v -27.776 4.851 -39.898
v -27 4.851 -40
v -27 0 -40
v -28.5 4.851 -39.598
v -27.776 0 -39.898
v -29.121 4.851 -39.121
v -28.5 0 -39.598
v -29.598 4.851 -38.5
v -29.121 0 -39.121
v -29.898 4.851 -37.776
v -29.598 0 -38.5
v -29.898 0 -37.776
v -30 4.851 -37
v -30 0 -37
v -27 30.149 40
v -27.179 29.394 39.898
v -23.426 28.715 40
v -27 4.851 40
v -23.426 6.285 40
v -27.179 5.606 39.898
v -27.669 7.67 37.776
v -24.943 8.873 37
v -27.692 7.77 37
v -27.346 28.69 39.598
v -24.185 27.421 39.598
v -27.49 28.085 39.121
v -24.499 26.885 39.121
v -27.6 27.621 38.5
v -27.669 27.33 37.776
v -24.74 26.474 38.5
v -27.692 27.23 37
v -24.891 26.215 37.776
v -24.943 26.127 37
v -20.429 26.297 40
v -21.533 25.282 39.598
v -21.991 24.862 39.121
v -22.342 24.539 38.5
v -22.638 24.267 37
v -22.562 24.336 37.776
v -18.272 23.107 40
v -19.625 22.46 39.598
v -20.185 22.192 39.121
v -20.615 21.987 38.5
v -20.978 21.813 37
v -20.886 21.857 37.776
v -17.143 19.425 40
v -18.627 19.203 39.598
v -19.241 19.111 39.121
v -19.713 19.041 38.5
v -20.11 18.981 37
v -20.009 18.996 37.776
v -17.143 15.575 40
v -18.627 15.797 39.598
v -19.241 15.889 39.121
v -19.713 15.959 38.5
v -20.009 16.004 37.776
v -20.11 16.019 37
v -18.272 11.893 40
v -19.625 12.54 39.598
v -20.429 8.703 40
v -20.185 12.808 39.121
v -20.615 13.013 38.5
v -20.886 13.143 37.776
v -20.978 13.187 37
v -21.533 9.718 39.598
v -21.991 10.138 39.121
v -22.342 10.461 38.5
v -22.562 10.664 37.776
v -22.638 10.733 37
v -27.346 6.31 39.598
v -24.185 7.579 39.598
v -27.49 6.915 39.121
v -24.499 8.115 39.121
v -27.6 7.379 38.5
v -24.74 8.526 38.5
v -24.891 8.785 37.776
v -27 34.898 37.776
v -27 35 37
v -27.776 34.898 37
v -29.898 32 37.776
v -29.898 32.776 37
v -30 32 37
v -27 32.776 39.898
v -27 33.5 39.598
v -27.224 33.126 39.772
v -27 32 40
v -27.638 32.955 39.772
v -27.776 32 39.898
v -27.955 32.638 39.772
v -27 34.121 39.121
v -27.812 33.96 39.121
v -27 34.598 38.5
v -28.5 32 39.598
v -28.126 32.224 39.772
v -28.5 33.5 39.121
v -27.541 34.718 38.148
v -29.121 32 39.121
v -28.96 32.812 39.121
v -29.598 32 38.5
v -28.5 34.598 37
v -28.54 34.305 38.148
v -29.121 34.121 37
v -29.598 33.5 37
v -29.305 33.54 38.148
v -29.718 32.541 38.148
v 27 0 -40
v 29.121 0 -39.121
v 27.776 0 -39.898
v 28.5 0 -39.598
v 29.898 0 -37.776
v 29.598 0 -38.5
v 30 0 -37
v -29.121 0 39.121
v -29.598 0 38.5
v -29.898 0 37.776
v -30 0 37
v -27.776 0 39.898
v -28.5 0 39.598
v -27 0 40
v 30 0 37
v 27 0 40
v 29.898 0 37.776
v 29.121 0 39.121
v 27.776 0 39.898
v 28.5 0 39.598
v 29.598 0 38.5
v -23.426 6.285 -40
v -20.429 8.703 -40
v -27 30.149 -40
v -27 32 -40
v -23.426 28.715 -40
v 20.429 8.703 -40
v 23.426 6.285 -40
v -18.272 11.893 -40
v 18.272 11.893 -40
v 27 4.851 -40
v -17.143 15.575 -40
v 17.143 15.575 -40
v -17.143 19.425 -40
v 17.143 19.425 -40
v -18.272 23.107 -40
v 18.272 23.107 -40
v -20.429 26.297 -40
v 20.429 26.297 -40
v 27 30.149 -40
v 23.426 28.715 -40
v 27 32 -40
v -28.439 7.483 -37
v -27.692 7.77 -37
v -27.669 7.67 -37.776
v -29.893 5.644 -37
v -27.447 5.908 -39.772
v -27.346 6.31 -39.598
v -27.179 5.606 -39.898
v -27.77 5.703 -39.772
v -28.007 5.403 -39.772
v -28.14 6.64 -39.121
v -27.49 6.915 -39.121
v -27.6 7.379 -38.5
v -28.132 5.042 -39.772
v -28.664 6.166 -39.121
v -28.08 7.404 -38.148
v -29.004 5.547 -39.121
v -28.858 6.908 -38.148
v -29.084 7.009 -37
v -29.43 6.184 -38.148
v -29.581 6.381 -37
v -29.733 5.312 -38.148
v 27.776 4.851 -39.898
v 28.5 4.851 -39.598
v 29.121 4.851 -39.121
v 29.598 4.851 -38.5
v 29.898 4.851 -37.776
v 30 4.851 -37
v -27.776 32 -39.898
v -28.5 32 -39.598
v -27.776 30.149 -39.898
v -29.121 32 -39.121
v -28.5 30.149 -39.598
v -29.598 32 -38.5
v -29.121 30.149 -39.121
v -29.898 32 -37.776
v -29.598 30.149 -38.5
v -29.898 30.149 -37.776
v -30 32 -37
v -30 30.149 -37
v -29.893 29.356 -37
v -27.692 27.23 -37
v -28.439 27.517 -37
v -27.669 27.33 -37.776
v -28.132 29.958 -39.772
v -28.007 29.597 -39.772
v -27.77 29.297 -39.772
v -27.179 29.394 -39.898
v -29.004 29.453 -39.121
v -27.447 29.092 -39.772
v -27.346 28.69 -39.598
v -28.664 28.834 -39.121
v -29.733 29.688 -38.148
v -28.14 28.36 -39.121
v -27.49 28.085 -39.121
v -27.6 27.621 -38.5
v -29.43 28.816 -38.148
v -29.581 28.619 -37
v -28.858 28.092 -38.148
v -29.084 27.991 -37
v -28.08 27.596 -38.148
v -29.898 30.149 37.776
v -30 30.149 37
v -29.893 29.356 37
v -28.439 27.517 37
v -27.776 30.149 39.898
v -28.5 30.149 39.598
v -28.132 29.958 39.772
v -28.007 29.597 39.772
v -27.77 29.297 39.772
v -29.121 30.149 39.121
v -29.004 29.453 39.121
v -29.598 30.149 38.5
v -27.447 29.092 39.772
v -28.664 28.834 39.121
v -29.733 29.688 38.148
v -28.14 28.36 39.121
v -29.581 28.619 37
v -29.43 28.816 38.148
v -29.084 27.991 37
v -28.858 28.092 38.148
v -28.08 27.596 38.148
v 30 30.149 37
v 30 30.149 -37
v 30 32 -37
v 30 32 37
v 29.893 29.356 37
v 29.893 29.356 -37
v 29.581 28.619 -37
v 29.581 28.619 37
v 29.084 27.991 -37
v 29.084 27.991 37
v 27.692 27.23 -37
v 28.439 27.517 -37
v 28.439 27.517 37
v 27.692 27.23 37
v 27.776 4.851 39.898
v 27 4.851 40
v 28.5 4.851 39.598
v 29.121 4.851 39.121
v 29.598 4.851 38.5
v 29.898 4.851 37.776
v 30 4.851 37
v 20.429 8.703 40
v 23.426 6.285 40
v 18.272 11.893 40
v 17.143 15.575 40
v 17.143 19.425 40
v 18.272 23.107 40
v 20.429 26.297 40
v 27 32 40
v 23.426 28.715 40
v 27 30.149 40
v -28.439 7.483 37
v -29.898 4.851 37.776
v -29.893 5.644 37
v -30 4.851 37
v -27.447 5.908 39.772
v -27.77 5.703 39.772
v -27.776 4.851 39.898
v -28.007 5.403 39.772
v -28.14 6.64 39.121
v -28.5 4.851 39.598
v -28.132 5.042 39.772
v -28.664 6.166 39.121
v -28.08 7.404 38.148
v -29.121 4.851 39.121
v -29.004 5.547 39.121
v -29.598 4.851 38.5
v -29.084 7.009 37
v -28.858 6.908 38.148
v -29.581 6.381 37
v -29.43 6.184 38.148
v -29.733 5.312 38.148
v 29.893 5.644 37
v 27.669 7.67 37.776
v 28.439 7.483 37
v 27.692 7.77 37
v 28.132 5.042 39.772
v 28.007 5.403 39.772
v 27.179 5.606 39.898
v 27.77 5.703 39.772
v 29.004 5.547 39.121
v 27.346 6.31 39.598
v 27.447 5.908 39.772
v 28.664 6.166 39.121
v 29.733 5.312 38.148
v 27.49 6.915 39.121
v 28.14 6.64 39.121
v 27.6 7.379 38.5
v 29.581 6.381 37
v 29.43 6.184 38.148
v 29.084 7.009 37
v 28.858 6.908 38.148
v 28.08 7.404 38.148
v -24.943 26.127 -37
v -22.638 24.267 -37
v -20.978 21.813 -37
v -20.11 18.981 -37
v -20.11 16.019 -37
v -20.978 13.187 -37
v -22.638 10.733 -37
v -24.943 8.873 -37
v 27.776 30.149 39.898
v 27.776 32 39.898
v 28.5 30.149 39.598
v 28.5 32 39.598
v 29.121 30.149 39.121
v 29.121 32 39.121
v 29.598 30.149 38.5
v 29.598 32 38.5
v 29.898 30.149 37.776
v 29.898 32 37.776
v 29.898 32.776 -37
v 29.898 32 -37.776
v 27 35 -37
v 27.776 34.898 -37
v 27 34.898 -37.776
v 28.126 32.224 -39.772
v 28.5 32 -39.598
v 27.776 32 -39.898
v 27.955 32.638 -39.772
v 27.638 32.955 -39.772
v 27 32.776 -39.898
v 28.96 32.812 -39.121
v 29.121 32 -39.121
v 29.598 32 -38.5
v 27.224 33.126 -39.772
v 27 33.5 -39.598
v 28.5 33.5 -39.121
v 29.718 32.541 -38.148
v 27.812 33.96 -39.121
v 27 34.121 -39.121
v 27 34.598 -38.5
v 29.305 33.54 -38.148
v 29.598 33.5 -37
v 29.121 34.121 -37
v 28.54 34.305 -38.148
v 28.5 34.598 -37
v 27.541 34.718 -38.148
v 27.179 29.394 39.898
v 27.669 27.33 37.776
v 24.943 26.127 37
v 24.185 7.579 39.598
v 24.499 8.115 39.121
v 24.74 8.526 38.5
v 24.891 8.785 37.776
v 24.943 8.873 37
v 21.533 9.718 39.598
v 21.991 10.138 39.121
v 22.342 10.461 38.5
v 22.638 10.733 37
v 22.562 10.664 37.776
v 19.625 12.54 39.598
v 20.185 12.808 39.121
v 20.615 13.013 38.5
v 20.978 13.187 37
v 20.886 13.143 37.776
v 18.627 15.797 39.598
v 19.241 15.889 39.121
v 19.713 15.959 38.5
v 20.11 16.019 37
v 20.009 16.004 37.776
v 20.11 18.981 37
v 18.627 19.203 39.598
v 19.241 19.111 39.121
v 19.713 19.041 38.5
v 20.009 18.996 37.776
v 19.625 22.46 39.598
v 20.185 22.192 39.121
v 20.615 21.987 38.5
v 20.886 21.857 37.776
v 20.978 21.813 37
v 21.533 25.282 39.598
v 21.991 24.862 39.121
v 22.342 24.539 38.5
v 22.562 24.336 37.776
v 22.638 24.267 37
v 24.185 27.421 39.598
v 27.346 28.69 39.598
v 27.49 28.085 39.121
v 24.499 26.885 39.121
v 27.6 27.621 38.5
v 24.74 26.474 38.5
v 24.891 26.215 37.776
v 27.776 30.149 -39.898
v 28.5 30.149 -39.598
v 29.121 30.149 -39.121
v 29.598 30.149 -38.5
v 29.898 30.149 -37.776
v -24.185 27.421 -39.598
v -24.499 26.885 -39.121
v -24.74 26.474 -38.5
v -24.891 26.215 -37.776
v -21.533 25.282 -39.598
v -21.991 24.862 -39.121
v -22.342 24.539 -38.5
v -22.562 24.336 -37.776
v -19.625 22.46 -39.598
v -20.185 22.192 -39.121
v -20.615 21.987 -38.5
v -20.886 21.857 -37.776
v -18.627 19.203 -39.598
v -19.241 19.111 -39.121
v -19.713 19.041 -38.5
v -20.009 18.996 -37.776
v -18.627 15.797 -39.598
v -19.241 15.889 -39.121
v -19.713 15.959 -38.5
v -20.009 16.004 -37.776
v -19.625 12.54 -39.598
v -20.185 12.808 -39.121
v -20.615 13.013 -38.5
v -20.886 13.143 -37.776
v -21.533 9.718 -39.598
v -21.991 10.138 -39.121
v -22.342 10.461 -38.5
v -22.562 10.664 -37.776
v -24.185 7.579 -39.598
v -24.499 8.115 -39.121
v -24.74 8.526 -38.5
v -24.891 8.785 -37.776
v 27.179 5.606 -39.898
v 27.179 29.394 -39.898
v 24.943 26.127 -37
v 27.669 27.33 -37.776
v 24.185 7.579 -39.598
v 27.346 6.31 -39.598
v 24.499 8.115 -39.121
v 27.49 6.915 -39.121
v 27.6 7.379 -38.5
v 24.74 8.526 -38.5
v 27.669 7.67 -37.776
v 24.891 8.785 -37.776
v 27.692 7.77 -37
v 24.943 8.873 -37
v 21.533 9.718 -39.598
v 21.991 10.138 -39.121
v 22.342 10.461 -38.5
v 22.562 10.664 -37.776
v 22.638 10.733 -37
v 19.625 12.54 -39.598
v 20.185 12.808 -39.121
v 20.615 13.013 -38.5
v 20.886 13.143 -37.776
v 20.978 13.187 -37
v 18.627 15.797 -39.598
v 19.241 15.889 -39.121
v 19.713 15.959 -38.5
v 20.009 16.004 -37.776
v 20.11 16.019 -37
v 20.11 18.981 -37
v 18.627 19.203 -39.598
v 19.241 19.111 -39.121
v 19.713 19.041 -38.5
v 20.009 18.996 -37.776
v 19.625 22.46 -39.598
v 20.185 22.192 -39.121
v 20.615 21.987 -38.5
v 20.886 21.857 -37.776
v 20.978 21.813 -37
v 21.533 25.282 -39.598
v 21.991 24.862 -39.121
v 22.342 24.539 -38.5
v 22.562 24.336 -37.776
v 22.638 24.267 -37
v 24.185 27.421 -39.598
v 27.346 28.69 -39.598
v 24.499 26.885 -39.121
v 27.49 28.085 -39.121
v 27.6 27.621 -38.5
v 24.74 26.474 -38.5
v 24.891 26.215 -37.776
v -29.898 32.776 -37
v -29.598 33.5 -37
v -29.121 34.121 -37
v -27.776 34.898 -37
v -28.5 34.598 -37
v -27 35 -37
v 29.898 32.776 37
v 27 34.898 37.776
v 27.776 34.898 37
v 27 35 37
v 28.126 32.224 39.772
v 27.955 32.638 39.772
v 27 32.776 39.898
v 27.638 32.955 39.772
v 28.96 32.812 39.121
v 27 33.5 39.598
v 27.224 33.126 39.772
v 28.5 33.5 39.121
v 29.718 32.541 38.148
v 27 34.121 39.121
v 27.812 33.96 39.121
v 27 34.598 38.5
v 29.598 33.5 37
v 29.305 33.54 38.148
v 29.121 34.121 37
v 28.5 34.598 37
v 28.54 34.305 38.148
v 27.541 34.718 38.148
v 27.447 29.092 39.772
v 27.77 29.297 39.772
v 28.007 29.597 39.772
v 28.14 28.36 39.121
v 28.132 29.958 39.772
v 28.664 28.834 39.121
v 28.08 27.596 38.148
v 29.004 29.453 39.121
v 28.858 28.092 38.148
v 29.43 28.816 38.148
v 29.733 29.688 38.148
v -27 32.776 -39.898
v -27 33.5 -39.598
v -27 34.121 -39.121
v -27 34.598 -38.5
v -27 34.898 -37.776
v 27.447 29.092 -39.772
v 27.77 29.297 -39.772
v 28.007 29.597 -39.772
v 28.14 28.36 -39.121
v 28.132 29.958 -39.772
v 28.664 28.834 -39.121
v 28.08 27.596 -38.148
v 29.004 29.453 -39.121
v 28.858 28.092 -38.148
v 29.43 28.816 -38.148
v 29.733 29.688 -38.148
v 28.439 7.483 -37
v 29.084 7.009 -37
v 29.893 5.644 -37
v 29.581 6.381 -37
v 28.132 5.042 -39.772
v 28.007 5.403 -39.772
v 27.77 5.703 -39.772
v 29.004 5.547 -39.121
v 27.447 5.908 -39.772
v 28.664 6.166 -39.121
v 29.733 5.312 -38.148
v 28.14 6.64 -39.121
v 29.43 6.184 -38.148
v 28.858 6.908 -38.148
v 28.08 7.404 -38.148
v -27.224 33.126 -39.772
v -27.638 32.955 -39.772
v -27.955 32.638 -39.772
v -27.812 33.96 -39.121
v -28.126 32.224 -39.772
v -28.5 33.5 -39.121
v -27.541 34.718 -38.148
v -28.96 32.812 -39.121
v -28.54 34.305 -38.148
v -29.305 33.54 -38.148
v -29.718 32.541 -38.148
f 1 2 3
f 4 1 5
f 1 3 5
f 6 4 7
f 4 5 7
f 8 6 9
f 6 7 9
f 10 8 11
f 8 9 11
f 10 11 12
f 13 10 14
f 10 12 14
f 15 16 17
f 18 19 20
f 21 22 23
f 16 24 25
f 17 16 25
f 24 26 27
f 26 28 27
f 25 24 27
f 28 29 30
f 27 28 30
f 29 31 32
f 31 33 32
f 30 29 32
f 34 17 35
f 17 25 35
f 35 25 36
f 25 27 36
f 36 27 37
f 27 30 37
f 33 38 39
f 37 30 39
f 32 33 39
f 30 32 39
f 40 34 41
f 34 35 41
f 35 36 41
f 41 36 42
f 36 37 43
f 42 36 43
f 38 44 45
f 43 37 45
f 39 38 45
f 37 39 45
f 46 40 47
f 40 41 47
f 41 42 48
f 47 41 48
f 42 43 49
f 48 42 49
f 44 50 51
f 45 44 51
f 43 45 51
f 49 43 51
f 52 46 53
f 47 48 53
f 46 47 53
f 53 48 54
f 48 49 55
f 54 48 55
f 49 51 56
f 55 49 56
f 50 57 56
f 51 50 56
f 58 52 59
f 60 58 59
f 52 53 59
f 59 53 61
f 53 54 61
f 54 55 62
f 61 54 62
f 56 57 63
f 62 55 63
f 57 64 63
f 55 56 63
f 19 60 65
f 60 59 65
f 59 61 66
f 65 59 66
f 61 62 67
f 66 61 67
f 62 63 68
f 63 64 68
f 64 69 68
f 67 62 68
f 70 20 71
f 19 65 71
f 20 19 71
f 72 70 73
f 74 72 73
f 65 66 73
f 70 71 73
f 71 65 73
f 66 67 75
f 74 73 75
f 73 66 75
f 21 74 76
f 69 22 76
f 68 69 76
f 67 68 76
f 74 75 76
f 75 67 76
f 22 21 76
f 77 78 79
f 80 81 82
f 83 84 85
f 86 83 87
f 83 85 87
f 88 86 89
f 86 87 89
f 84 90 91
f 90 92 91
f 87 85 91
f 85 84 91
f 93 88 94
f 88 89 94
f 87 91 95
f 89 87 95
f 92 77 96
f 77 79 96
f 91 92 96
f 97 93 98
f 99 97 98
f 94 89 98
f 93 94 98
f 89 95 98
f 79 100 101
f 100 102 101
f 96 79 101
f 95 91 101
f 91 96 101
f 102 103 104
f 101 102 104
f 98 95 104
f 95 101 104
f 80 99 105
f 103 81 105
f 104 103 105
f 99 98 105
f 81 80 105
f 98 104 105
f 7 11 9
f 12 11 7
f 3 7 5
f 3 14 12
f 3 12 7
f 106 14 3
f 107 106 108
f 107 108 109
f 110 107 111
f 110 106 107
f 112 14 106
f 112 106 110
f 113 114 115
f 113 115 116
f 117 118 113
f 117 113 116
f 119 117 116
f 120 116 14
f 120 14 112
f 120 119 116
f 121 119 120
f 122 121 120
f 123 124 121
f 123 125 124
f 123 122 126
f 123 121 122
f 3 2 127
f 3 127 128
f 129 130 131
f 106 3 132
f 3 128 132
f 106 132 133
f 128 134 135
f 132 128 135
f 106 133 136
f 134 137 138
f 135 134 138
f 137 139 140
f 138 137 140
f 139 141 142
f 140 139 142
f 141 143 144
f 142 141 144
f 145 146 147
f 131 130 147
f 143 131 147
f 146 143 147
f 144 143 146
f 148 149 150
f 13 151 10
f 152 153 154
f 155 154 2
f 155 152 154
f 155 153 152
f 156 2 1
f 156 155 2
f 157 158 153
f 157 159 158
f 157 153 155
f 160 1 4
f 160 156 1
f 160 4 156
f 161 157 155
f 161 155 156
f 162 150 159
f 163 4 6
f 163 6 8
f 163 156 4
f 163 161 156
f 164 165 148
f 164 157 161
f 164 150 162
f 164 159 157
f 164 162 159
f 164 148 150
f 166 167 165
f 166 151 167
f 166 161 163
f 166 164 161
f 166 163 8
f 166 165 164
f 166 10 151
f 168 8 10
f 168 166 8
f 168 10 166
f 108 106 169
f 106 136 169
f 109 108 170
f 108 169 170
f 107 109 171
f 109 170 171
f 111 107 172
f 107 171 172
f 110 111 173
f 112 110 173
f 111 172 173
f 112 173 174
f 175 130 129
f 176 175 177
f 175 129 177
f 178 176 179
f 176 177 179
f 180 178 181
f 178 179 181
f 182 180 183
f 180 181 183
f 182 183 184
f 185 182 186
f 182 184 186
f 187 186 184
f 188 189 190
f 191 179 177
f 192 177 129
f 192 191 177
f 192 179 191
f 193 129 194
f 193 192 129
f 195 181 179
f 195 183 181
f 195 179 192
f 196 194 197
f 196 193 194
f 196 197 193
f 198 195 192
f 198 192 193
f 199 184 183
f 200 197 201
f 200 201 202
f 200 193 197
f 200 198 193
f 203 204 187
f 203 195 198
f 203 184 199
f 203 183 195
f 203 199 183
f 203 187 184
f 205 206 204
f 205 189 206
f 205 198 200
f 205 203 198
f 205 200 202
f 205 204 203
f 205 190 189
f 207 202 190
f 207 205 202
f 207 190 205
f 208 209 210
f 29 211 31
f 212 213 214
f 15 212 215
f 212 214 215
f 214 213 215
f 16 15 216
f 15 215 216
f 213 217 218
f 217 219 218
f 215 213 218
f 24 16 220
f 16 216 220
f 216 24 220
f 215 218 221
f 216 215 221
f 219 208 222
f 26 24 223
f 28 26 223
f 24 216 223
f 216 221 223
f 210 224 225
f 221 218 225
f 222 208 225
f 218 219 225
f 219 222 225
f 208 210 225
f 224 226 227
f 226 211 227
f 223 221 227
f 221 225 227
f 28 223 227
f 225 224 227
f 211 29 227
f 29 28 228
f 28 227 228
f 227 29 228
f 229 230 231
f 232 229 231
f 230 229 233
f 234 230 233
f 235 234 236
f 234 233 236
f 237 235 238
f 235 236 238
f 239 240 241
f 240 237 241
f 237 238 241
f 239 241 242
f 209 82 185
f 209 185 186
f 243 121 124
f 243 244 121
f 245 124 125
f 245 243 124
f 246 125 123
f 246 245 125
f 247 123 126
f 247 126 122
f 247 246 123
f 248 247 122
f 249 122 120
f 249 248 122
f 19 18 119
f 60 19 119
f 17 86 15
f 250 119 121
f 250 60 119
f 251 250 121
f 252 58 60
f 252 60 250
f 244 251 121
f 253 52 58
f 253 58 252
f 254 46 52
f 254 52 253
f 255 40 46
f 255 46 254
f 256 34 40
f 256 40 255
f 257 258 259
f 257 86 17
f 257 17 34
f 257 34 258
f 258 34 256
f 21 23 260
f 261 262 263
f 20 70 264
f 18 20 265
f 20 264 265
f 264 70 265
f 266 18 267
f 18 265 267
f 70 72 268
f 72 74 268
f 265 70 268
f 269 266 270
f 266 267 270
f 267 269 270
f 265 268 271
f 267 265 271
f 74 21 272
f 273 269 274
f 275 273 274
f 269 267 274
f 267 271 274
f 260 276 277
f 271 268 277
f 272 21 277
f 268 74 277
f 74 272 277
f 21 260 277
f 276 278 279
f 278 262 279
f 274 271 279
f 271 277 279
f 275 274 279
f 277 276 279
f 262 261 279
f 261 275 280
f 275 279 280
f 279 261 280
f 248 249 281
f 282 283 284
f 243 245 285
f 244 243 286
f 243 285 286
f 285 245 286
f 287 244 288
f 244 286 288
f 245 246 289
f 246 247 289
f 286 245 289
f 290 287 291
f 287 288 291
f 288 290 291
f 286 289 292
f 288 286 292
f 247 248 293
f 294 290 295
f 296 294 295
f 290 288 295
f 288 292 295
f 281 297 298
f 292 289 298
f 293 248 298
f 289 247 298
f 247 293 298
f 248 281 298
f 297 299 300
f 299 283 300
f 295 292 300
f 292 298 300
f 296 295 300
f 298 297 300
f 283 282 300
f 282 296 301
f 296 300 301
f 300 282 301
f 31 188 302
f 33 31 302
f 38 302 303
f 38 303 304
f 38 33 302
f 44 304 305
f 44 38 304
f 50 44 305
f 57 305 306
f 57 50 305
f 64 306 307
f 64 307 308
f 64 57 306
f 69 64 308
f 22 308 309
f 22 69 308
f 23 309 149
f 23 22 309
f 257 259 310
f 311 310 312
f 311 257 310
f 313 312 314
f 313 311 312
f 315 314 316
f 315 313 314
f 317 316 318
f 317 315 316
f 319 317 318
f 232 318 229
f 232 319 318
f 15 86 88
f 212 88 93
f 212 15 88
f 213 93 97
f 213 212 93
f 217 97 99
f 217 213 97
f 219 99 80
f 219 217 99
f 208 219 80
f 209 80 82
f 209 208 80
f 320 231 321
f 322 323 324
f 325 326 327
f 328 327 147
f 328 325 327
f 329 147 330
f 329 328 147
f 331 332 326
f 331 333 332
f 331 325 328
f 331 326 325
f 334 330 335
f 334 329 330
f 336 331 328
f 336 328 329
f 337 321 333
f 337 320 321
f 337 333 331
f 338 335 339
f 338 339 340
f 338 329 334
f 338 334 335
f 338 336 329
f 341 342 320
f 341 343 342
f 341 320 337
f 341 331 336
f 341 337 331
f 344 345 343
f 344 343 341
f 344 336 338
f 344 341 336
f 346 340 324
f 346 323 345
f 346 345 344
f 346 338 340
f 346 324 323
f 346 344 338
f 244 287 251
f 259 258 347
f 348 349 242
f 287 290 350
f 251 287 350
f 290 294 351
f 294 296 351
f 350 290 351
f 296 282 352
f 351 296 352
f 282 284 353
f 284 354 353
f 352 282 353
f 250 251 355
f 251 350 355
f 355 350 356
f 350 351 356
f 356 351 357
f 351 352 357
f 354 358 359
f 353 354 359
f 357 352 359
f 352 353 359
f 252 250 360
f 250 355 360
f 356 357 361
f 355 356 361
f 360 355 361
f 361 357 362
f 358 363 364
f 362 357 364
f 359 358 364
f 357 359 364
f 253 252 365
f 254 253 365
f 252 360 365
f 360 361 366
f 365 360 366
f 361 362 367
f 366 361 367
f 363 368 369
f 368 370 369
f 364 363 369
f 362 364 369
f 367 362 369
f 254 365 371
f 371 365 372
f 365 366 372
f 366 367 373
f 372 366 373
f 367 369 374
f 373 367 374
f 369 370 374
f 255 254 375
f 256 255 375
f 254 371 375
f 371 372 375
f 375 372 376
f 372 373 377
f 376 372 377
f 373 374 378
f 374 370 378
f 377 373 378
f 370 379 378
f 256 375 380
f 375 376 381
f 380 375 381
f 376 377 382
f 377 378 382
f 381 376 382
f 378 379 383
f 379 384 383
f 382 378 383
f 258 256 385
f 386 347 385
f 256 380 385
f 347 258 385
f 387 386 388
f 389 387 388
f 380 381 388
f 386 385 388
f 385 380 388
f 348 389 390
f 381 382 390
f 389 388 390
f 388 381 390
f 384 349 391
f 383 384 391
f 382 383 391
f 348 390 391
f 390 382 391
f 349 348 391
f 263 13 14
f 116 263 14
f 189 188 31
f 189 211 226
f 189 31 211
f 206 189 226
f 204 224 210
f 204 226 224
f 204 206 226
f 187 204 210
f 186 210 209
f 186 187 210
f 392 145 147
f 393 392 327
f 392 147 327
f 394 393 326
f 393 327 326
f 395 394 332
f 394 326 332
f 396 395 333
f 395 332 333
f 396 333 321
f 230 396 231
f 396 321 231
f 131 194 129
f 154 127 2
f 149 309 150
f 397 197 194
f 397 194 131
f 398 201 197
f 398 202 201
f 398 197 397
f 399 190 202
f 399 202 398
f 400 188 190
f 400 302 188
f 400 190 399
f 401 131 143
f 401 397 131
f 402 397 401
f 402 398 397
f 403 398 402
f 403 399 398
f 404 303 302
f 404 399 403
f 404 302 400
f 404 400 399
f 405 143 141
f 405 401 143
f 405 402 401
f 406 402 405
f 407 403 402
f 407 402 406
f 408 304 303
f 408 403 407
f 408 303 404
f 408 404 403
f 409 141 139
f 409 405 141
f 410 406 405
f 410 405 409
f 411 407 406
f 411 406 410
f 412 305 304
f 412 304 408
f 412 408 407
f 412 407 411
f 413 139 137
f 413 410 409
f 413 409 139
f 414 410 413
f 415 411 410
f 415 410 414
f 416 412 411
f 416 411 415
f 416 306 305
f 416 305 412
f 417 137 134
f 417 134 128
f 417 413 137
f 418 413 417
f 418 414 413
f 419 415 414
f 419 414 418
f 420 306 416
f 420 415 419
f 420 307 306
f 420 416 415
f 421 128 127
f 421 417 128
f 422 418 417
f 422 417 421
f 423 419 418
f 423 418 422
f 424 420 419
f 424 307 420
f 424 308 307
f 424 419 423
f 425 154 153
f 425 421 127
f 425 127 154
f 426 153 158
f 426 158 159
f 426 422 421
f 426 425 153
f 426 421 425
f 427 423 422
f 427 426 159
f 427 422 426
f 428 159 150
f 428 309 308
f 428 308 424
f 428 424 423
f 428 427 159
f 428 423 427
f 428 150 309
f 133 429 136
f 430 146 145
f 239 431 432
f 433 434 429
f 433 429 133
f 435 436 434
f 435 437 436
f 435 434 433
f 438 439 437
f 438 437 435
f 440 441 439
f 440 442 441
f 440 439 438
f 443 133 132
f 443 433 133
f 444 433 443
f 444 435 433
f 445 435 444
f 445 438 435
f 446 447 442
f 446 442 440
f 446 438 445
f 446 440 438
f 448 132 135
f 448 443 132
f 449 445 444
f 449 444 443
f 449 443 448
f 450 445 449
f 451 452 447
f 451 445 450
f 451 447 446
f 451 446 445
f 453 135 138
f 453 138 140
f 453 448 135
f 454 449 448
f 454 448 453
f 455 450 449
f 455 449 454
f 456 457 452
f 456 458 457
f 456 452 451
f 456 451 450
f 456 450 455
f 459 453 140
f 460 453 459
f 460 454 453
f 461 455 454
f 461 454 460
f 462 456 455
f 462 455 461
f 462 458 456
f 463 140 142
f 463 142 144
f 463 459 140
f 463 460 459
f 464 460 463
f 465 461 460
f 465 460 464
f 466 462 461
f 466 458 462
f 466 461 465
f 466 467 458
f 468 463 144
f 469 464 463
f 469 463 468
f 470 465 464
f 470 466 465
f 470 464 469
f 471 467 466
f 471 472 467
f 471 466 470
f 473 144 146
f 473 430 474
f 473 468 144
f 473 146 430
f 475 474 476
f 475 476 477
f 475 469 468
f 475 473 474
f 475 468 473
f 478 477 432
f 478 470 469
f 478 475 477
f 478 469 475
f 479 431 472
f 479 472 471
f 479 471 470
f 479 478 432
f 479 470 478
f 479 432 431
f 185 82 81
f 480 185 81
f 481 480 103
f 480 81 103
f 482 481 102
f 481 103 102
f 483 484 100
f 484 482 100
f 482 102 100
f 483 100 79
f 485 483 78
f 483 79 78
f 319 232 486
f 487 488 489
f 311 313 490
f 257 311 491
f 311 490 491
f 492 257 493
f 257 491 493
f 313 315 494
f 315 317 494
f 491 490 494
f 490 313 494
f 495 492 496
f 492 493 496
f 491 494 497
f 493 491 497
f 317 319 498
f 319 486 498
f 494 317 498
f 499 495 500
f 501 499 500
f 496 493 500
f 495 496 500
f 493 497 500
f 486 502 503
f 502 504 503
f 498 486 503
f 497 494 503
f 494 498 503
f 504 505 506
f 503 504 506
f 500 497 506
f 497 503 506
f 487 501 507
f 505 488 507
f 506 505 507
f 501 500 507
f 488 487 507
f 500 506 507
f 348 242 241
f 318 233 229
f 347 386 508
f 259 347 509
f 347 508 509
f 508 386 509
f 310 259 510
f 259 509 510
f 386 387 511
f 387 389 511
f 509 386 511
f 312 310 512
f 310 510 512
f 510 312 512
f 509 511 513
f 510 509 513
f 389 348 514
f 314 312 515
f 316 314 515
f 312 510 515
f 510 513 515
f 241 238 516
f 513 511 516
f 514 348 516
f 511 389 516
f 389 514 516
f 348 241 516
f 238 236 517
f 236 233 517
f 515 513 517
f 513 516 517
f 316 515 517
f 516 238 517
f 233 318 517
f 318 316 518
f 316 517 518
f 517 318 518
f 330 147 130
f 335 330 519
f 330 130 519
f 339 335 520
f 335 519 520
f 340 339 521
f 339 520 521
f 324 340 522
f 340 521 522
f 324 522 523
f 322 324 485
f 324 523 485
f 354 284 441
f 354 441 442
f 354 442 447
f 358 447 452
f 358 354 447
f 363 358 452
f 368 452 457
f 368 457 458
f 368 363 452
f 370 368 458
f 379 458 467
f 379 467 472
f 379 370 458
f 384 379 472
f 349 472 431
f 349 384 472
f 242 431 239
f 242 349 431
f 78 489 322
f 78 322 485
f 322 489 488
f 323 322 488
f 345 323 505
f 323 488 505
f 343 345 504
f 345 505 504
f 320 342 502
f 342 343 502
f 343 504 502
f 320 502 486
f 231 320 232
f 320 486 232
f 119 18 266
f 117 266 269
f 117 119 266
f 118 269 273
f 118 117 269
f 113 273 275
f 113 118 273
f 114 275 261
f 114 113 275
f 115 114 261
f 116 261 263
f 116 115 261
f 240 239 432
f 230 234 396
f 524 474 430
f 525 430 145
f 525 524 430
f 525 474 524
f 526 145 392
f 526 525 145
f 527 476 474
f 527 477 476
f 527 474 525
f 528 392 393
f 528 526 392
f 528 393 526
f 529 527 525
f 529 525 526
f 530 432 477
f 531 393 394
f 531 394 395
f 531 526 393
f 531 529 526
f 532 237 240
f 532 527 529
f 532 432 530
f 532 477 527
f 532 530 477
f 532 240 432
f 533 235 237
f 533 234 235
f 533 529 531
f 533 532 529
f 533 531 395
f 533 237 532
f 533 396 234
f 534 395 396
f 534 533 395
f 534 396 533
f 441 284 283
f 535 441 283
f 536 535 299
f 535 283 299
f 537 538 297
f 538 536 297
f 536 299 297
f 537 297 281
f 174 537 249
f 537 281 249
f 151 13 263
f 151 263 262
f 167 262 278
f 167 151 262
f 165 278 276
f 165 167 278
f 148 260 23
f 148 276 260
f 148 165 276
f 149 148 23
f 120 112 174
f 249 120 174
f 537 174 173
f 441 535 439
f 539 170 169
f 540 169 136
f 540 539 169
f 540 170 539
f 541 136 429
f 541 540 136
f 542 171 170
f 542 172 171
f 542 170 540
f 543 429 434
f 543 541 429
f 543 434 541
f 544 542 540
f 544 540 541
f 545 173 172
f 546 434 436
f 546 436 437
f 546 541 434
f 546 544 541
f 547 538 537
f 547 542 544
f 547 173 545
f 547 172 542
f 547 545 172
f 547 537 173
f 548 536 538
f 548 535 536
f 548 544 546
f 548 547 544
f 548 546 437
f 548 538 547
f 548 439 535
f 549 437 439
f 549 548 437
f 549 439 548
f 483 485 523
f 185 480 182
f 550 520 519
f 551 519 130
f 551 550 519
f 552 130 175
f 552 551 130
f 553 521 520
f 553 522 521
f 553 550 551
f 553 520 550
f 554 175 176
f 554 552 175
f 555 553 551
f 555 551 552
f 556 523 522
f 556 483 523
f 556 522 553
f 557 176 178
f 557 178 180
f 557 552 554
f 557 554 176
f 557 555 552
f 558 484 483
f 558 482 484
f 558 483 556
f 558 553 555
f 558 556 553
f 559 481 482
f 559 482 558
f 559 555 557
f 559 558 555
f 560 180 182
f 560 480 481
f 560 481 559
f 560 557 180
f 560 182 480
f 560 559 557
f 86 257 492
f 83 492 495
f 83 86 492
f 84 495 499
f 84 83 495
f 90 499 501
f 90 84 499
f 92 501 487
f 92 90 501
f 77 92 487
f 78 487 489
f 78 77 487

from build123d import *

# Parameters (mm, degrees)
EXTRUDE_1_DEPTH = 40
FILLET_1_R      = 3
FILLET_2_R      = 3


with BuildPart() as part:
    # Эскиз1 → Бобышка-Вытянуть1 (new, symmetric)
    with BuildSketch(Plane.XY):
        with BuildLine():
            Line((-30, 0), (30, 0))
            Line((30, 0), (30, 7.5))
            ThreePointArc((30, 7.5), (20, 17.5), (30, 27.5))
            Line((30, 27.5), (30, 35))
            Line((30, 35), (-30, 35))
            Line((-30, 35), (-30, 27.5))
            ThreePointArc((-30, 27.5), (-20, 17.5), (-30, 7.5))
            Line((-30, 7.5), (-30, 0))
        make_face()
    extrude(amount=EXTRUDE_1_DEPTH, both=True)

    # Скругление1
    fillet_1_edges = [part.edges().sort_by_distance(p)[0] for p in [
        (-30, 7.5, 0),
        (-30, 27.5, 0),
        (-30, 35, 0),
        (30, 35, 0),
        (30, 27.5, 0),
        (30, 7.5, 0),
    ]]
    fillet(fillet_1_edges, radius=FILLET_1_R)

    # Скругление2
    fillet_2_edges = [part.edges().sort_by_distance(p)[0] for p in [
        (30, 2.42544468, 40),
        (20, 17.5, -40),
        (20, 17.5, 40),
        (-30, 2.42544468, -40),
        (-20, 17.5, -40),
        (-30, 31.07455532, -40),
        (0, 35, -40),
        (30, 31.07455532, -40),
        (29.121320344, 34.121320344, -40),
        (-29.121320344, 34.121320344, -40),
        (29.353393622, 28.288589622, -40),
        (-29.353393622, 28.288589622, -40),
        (-29.353393622, 6.711410378, -40),
        (29.353393622, 6.711410378, -40),
        (-30, 2.42544468, 40),
        (30, 31.07455532, 40),
        (0, 35, 40),
        (-30, 31.07455532, 40),
        (-20, 17.5, 40),
        (29.121320344, 34.121320344, 40),
        (-29.121320344, 34.121320344, 40),
        (29.353393622, 28.288589622, 40),
        (-29.353393622, 28.288589622, 40),
        (-29.353393622, 6.711410378, 40),
        (29.353393622, 6.711410378, 40),
        (30, 2.42544468, -40),
    ]]
    fillet(fillet_2_edges, radius=FILLET_2_R)


solid = part.part
